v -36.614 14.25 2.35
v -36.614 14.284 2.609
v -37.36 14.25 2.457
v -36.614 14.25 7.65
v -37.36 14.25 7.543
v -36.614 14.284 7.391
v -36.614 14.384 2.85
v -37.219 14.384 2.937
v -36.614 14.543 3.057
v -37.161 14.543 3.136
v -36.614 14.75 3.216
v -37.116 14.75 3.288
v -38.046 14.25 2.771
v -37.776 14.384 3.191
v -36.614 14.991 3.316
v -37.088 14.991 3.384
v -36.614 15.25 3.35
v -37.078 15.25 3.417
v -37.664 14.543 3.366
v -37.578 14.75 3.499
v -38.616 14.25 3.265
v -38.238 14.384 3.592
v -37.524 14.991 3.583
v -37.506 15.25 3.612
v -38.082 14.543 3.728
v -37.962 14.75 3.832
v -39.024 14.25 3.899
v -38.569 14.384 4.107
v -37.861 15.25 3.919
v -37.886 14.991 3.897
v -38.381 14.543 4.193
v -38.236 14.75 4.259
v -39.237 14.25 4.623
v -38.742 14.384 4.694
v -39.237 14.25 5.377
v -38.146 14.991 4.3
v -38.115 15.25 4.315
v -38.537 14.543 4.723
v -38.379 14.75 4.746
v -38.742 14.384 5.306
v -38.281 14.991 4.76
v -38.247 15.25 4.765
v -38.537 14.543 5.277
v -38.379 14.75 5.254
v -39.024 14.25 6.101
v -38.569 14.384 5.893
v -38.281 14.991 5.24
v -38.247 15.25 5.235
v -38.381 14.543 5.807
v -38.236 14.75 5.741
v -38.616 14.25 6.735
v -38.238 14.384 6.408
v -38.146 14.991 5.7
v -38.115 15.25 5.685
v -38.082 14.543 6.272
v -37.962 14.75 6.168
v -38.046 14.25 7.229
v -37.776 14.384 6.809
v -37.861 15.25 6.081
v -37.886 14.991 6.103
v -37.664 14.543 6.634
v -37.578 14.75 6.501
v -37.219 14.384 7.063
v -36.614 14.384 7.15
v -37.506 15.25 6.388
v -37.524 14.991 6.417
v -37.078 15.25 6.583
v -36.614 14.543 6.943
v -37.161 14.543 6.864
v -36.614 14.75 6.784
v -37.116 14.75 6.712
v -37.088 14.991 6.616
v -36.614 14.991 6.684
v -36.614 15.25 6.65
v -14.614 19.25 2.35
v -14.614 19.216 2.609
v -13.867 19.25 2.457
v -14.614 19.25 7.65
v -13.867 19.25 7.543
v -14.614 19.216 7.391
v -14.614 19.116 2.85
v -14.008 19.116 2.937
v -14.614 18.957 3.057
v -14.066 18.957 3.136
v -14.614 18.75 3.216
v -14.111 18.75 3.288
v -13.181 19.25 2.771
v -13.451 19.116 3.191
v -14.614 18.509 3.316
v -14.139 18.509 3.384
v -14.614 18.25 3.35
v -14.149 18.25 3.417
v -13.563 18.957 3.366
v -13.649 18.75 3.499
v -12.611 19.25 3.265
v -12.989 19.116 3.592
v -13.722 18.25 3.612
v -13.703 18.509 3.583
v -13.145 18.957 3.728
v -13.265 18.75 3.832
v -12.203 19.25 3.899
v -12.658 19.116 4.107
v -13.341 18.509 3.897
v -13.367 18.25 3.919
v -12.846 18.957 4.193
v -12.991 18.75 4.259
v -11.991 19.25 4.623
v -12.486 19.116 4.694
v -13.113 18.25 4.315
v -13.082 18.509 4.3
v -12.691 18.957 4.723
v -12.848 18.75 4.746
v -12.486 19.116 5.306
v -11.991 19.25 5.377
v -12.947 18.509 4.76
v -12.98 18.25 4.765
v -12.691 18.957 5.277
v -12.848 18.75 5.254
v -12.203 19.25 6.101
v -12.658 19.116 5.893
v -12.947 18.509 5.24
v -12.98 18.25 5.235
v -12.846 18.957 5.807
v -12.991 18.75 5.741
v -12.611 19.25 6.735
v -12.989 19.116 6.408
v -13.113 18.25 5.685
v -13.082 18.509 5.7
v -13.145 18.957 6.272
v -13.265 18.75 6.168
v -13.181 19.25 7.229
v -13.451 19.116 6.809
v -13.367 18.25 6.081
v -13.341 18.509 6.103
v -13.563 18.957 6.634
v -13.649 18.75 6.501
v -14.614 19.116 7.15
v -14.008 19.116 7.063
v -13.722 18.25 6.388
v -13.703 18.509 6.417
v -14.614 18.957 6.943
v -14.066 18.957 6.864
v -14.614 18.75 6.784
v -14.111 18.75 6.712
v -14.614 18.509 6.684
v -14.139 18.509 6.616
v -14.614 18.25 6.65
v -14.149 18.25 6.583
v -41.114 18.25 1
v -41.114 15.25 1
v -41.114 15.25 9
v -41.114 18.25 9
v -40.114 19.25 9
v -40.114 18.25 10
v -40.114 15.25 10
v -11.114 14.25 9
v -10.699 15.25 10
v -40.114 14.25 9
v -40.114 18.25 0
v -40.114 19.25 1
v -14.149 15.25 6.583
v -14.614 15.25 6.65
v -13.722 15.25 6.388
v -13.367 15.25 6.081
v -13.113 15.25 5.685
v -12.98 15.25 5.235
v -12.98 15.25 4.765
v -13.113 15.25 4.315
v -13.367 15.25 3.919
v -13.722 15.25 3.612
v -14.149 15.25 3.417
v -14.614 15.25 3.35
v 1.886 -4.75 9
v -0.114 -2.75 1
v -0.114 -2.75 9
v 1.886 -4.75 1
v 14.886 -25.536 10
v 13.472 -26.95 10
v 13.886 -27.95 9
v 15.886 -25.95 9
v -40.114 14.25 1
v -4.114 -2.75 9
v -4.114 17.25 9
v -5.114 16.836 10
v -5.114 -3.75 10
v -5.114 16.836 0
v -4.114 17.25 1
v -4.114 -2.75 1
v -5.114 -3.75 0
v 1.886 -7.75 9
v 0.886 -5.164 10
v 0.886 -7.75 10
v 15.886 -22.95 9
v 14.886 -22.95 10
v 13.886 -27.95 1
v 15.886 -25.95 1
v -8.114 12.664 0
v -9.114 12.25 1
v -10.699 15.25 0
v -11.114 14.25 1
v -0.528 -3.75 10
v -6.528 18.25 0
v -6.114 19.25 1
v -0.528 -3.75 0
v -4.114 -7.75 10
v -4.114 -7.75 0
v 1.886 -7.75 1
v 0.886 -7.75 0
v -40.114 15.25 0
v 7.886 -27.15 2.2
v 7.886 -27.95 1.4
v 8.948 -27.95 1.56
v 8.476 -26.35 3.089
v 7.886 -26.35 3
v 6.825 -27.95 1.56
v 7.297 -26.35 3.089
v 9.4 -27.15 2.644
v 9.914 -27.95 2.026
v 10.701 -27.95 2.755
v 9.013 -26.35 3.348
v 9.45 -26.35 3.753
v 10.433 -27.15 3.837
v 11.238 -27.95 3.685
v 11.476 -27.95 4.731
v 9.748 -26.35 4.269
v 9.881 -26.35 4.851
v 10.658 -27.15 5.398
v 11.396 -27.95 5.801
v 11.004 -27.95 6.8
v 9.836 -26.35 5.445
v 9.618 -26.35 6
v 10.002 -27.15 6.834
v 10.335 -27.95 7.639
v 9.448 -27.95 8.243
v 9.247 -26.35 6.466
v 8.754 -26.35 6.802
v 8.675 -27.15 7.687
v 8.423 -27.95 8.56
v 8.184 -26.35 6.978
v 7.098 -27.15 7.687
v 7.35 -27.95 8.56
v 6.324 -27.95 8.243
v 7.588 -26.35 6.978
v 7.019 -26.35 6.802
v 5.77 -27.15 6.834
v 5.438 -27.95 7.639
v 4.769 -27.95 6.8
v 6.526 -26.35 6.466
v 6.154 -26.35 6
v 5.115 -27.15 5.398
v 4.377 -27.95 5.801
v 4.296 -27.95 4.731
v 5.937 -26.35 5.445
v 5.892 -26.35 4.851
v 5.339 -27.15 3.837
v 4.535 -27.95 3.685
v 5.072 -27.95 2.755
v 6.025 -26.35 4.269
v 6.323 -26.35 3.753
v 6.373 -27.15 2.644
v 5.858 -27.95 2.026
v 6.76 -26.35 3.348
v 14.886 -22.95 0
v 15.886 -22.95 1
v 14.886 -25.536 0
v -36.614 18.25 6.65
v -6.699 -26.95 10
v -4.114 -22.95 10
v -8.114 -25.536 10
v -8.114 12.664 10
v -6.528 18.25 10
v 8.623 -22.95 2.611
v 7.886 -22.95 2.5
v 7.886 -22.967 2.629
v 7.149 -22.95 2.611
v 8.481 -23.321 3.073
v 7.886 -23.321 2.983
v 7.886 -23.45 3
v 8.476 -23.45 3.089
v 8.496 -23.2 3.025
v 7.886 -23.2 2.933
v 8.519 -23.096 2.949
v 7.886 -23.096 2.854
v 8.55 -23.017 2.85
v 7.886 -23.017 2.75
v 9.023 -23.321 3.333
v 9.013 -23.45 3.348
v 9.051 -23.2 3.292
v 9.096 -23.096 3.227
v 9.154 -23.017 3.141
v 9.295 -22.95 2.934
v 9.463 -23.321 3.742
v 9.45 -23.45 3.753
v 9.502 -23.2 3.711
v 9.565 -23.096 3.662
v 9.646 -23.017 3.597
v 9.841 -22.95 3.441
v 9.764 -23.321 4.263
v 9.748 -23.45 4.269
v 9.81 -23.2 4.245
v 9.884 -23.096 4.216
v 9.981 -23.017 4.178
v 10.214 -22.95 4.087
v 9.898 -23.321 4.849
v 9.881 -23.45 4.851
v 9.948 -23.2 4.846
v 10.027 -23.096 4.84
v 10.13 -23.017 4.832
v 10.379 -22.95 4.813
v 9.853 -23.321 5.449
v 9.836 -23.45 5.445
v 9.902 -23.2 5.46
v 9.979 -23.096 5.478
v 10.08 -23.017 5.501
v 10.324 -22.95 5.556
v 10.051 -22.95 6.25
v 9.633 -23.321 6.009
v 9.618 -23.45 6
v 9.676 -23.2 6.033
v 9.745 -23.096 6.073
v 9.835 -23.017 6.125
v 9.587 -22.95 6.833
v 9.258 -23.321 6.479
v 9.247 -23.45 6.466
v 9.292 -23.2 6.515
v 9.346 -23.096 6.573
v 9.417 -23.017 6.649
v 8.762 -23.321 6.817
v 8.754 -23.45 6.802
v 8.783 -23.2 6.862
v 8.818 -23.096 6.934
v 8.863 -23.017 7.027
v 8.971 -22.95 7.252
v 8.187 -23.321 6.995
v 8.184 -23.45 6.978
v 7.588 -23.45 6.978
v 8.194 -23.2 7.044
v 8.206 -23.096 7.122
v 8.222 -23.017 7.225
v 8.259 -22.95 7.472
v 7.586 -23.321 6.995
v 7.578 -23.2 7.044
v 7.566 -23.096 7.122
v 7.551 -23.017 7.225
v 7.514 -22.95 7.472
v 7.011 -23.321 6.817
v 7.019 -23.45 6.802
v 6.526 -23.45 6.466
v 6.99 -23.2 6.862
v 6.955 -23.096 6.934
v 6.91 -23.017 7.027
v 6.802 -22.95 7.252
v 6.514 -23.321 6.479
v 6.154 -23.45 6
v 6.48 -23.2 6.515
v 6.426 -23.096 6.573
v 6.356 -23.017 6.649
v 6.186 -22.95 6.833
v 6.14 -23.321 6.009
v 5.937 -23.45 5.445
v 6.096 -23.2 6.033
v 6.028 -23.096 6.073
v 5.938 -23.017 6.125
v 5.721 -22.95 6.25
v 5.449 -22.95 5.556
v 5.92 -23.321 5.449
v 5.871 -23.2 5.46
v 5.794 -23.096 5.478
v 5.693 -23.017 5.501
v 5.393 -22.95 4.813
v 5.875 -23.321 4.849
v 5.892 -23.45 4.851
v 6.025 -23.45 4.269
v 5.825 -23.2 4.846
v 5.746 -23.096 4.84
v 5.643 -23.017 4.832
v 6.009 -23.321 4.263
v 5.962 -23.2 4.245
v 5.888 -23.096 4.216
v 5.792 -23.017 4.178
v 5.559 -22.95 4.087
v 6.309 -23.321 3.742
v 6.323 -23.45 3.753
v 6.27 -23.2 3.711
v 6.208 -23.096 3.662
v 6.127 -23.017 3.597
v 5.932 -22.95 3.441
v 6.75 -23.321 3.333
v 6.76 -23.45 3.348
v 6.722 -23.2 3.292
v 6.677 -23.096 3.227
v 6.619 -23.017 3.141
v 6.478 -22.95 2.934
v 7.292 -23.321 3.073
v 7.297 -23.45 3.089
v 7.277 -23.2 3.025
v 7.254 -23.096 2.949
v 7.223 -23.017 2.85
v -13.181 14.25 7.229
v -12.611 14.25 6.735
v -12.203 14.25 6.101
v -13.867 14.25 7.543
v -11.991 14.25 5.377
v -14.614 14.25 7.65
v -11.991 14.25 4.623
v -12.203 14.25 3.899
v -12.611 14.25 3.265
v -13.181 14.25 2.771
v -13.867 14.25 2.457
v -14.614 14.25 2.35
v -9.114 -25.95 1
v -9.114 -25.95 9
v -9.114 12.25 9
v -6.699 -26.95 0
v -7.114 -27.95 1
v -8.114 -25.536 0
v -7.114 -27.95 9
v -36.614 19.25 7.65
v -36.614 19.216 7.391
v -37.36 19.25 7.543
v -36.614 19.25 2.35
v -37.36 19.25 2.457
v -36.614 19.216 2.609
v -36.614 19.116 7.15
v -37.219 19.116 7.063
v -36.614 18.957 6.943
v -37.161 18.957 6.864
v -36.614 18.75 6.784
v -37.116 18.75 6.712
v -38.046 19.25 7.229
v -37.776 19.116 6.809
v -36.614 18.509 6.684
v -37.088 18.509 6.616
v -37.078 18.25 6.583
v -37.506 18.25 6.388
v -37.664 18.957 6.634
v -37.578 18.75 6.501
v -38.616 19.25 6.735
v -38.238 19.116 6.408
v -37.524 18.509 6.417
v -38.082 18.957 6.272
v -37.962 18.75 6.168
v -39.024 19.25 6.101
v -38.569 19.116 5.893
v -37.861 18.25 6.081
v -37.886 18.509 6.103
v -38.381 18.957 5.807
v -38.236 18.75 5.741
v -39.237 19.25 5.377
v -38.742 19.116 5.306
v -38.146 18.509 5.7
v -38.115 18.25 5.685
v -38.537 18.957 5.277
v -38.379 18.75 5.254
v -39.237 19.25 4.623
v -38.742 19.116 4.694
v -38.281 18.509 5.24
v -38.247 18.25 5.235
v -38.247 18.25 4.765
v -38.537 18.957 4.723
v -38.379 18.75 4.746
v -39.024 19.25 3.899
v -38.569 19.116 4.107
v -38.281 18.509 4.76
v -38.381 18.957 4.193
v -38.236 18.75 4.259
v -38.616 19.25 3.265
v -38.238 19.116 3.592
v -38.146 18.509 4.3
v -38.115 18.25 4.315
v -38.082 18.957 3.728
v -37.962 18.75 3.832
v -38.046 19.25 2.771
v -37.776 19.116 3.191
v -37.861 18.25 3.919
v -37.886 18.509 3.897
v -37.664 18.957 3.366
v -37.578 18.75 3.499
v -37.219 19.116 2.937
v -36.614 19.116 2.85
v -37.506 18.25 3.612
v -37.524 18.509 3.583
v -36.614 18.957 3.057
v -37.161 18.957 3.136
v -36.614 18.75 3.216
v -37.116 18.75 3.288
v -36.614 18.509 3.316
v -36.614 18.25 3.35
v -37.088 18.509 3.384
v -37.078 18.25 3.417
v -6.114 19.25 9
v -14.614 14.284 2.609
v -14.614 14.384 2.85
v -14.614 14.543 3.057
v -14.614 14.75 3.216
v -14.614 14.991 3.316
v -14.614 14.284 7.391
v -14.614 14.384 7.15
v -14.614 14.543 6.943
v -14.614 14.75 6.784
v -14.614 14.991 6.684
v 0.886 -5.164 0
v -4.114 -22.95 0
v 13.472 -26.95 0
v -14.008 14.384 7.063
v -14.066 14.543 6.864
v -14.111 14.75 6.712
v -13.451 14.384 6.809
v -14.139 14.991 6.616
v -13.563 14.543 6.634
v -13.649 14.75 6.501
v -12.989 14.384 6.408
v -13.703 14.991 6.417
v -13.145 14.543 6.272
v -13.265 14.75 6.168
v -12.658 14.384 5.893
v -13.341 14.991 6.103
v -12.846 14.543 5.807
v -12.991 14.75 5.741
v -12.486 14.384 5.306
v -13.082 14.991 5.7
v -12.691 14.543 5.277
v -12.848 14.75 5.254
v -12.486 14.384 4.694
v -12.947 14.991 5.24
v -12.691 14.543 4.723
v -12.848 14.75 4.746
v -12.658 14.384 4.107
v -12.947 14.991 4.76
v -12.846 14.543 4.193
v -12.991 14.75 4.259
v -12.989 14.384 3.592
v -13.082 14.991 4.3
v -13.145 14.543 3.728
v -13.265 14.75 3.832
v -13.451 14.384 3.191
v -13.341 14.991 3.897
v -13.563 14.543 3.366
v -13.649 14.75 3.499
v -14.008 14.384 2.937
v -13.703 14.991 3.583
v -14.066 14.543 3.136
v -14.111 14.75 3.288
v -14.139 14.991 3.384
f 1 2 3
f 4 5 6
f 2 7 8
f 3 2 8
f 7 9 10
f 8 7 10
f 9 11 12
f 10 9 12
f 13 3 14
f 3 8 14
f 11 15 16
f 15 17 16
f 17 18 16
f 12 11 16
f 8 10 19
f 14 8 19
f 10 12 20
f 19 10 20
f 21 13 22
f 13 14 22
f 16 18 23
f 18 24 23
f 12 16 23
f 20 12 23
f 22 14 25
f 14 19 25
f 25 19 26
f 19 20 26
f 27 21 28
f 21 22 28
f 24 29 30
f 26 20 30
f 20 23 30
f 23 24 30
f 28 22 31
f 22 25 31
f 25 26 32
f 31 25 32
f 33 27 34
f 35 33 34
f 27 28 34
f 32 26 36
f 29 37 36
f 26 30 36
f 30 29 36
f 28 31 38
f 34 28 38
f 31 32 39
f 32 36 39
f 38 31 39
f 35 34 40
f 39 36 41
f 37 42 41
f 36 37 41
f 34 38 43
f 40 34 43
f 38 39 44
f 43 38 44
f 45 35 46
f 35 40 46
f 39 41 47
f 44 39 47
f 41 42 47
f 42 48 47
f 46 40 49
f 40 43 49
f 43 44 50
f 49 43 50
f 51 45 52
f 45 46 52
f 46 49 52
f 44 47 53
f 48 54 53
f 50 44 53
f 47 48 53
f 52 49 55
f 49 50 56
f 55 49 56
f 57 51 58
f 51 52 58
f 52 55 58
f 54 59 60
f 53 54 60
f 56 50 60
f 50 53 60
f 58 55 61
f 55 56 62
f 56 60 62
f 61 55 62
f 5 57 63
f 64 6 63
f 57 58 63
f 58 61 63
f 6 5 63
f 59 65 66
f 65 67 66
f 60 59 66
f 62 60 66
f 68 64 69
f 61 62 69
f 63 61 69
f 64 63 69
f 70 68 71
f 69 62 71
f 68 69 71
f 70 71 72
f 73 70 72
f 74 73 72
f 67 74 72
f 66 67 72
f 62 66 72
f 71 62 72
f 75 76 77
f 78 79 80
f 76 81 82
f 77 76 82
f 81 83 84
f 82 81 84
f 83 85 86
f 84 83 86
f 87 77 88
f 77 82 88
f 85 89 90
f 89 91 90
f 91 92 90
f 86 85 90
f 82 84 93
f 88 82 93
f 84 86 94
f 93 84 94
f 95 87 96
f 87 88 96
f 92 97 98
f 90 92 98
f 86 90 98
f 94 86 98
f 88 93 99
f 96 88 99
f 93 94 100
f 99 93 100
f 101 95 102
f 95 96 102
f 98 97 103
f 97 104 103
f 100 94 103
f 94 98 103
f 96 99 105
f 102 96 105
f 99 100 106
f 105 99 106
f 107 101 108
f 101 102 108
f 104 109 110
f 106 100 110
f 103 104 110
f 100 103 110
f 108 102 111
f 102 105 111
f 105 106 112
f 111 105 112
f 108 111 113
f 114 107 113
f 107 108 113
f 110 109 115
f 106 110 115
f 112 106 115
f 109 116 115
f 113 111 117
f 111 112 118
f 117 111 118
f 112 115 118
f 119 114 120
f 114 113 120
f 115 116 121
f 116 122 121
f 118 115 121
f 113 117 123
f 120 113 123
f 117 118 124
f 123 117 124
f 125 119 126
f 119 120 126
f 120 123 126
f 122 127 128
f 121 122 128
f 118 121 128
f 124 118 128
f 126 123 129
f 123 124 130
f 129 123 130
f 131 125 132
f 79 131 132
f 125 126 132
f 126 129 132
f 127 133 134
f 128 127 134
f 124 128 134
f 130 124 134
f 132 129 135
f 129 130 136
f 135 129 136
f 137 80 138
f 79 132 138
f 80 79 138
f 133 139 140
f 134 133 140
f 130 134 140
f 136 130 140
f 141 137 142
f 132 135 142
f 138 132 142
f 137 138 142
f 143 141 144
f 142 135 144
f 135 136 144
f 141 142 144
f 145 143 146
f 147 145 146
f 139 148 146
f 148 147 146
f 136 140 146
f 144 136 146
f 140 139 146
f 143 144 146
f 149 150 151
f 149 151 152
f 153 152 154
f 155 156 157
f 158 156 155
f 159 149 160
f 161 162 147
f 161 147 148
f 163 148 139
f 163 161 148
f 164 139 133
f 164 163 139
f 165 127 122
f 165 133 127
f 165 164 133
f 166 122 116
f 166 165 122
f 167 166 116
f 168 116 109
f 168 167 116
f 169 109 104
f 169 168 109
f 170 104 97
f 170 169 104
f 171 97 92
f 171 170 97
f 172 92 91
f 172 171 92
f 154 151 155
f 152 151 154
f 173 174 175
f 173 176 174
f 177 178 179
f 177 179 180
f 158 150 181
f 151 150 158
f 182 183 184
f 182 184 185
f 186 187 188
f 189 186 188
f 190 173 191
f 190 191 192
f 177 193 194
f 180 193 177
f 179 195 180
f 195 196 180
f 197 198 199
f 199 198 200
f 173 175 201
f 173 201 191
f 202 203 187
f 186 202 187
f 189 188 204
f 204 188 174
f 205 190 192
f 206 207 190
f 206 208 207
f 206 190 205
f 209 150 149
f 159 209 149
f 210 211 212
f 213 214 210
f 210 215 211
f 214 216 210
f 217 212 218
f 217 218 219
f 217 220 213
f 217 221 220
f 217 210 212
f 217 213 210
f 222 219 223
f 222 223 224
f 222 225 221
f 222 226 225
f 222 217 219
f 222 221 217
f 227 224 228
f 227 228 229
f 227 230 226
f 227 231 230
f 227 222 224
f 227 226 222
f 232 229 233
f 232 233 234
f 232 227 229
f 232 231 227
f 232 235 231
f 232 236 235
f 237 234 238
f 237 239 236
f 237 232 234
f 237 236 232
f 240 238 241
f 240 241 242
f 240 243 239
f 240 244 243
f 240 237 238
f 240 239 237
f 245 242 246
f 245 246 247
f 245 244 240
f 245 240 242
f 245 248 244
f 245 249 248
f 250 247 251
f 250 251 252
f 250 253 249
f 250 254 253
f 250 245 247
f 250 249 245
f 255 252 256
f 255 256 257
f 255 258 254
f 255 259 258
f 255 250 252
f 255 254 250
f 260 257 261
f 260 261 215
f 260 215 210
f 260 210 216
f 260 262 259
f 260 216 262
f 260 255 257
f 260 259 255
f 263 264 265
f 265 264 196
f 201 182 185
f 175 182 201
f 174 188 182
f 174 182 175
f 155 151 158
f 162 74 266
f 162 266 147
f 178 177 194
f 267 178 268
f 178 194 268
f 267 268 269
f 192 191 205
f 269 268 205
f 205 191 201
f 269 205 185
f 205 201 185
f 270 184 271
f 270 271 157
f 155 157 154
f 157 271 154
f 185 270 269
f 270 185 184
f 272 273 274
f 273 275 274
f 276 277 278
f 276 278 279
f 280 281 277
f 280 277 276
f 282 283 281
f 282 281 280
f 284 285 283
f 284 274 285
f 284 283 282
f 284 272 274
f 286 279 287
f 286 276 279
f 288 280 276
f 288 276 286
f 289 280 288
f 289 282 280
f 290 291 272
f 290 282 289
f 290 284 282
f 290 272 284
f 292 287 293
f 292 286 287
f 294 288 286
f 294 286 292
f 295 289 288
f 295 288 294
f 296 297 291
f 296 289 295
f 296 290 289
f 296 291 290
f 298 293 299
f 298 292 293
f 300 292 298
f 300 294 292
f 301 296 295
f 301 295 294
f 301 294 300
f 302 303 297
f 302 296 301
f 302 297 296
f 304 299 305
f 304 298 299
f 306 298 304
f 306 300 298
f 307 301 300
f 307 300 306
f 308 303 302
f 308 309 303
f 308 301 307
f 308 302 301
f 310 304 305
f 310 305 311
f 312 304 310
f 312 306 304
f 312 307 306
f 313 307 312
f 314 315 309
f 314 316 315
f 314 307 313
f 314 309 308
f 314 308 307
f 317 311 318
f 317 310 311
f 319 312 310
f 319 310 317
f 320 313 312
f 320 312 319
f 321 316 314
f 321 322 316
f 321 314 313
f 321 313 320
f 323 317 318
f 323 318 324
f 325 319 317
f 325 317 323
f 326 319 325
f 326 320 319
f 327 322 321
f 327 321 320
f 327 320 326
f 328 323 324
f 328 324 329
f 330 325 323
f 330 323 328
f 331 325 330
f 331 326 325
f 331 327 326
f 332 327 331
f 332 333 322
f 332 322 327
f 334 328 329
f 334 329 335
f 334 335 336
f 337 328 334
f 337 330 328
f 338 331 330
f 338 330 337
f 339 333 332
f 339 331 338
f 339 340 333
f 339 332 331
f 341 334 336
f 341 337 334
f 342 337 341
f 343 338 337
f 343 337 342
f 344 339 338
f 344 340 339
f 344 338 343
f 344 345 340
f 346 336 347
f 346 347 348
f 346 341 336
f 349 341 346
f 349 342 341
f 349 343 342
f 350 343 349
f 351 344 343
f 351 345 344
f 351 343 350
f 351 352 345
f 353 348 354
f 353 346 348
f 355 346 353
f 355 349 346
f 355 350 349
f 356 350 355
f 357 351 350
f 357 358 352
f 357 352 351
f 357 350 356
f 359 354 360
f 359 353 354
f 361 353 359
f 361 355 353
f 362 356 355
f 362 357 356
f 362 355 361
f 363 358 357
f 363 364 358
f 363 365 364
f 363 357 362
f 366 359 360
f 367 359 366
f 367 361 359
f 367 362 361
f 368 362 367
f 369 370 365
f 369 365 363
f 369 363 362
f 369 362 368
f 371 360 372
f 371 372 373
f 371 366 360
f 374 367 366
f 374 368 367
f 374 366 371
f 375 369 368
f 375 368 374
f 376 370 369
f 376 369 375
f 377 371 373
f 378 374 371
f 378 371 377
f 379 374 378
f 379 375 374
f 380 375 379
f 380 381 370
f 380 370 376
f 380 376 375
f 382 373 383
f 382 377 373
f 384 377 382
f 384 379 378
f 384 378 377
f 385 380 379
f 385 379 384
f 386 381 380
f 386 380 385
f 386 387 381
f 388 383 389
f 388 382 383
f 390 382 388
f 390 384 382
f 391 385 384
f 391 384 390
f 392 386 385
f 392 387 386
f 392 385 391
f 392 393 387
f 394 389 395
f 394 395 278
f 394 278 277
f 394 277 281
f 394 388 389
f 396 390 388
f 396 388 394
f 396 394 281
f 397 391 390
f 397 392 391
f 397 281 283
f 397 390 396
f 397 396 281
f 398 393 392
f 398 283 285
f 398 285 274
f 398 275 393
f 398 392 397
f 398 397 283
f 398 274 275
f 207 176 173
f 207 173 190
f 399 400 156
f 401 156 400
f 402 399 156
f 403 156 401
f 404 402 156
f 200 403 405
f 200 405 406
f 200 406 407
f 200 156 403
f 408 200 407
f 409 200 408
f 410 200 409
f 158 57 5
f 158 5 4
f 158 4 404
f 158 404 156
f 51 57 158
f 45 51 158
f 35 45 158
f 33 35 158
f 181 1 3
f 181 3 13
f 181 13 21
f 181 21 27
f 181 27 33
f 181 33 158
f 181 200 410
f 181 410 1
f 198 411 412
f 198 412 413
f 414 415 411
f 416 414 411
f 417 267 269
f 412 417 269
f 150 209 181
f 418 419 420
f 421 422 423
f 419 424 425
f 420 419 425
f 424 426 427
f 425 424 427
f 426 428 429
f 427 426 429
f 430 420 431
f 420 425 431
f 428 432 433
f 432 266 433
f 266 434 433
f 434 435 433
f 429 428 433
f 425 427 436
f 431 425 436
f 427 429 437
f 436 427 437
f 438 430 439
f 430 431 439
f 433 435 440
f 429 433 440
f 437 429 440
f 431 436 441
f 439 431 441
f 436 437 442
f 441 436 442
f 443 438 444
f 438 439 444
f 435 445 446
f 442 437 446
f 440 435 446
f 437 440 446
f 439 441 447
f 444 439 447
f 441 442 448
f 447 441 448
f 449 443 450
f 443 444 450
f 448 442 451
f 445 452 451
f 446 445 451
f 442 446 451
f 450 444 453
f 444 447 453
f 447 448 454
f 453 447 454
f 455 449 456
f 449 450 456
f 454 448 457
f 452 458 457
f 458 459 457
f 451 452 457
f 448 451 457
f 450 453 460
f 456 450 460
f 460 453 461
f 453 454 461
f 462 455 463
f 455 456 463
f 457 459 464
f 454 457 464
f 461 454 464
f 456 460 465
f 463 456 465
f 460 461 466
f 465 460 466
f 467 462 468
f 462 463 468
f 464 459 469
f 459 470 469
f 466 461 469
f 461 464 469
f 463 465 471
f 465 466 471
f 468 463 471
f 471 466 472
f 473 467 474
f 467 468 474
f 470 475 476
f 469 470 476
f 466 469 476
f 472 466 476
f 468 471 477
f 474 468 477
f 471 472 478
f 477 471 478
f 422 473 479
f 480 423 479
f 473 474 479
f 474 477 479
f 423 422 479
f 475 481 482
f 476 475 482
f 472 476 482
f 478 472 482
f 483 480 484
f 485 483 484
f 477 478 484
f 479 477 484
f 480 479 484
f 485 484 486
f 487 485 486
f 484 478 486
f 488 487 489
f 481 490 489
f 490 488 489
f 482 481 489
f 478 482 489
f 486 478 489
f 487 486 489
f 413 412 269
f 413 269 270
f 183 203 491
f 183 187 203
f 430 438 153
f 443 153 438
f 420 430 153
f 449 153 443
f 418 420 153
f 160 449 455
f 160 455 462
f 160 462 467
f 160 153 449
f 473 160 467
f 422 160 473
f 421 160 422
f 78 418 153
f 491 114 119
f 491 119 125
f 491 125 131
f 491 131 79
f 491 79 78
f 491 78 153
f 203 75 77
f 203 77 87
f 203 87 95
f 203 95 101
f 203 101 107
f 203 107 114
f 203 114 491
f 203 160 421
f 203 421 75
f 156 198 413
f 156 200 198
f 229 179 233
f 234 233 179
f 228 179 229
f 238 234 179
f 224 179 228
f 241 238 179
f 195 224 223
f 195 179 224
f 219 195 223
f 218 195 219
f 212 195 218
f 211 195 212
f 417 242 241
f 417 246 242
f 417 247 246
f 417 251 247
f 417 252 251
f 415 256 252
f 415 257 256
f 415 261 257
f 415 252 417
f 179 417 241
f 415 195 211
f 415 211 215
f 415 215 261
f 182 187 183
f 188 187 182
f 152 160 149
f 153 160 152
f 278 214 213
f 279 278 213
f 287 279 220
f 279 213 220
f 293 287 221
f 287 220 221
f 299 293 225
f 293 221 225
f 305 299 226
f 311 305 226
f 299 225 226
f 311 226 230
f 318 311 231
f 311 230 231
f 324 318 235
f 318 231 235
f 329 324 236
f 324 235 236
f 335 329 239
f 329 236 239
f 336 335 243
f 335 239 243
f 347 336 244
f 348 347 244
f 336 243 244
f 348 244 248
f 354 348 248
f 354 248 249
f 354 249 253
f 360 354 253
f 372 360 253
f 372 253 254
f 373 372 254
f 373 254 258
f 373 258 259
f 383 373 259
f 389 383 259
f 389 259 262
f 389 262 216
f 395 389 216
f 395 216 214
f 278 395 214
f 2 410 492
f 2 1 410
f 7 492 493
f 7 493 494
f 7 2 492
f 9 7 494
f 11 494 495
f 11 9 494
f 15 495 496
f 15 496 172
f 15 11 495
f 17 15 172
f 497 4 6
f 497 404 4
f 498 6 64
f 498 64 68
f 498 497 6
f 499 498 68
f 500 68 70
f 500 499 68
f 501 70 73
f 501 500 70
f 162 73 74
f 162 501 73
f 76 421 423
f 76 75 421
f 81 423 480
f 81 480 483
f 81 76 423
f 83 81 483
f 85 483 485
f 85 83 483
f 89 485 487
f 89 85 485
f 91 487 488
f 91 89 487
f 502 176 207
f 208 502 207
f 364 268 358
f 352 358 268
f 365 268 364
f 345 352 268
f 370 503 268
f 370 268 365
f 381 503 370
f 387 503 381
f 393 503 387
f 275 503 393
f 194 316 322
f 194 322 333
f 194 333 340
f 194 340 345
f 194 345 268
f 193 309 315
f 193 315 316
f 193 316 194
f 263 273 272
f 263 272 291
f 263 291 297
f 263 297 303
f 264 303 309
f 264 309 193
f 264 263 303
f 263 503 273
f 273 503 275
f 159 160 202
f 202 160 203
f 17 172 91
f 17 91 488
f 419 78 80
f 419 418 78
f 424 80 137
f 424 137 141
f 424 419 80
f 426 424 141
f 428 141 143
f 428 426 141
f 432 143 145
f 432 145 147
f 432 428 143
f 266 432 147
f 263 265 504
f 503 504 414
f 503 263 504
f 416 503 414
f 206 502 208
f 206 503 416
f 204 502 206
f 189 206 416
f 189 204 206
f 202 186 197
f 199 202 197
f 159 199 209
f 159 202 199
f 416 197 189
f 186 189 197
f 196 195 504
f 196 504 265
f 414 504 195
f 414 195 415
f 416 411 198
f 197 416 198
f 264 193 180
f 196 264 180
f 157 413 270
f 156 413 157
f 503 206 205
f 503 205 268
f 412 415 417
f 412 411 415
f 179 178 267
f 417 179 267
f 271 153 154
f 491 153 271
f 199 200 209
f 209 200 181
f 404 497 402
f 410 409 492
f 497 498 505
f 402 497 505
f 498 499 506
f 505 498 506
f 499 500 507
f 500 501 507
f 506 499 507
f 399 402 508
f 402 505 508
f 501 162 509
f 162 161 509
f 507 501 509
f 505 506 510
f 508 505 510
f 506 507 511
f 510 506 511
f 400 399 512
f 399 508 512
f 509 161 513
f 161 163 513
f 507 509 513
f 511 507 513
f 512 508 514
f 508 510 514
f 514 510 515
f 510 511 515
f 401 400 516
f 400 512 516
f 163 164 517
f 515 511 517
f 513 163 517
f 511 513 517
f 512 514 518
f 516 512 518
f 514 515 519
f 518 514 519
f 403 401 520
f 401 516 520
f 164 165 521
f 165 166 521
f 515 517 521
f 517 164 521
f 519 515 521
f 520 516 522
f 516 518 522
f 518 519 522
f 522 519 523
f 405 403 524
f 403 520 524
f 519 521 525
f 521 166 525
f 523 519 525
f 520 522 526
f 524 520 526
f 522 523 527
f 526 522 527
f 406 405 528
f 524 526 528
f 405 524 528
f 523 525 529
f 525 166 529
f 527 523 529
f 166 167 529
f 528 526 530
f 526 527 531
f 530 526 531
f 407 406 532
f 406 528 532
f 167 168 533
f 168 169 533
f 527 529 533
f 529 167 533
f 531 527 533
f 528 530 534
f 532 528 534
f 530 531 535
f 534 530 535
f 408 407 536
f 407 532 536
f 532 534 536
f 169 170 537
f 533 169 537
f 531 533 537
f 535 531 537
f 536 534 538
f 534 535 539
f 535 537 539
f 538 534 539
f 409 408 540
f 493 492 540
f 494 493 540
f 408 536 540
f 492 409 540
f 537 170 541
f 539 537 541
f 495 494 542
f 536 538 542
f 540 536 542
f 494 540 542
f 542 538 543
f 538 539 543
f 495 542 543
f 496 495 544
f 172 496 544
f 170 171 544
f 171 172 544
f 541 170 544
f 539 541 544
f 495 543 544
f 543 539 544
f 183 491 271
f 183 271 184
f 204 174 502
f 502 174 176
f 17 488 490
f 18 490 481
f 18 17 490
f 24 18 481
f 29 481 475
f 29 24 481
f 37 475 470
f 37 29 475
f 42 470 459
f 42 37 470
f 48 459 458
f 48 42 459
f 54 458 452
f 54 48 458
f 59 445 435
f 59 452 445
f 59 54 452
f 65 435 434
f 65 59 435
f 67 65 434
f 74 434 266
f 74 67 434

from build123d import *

# Parameters (mm, degrees)
RESSALTO_EXTRUS_O1_DEPTH = 10
ESBO_O3_R                = 2
CORTE_EXTRUS_O1_DEPTH    = 15
CHANFRO1_SIZE            = 1.6
FILETE1_R                = 0.5
CHANFRO5_SIZE            = 2
CHANFRO8_SIZE            = 1
CORTE_EXTRUS_O3_DEPTH    = 10
FILETE3_R                = 1


with BuildPart() as part:
    # Esboço1 → Ressalto-extrusão1 (new body)
    with BuildSketch(Plane.XY):
        Polygon((1.886382163, -7.75), (-4.113617837, -7.75), (-4.113617837, -22.95), (15.886382163, -22.95), (15.886382163, -27.95), (-9.113617837, -27.95), (-9.113617837, 14.25), (-41.113617837, 14.25), (-41.113617837, 19.25), (-4.113617837, 19.25), (-4.113617837, -2.75), (1.886382163, -2.75), align=None)
    extrude(amount=RESSALTO_EXTRUS_O1_DEPTH)

    # Esboço3 → Corte-extrusão1 (cut)
    with BuildSketch(Plane.XZ.offset(27.95)):
        with Locations(Location((7.886382163, 5, 0), (0, 0, 270))):
            Circle(ESBO_O3_R)
    extrude(amount=-CORTE_EXTRUS_O1_DEPTH, mode=Mode.SUBTRACT)

    # Chanfro1
    chanfro1_edges = [part.edges().sort_by_distance(p)[0] for p in [
        (7.886382163, -27.95, 7),
    ]]
    chamfer(chanfro1_edges, length=CHANFRO1_SIZE)

    # Filete1
    filete1_edges = [part.edges().sort_by_distance(p)[0] for p in [
        (7.886382163, -22.95, 7),
    ]]
    fillet(filete1_edges, radius=FILETE1_R)

    # Chanfro5
    chanfro5_edges = [part.edges().sort_by_distance(p)[0] for p in [
        (15.886382163, -27.95, 5),
        (-9.113617837, -27.95, 5),
        (-9.113617837, 14.25, 5),
        (-4.113617837, 19.25, 5),
        (1.886382163, -2.75, 5),
    ]]
    chamfer(chanfro5_edges, length=CHANFRO5_SIZE)

    # Chanfro8
    chanfro8_edges = [part.edges().sort_by_distance(p)[0] for p in [
        (-4.113617837, 7.25, 10),
        (-26.113617837, 14.25, 0),
        (-41.113617837, 16.75, 0),
        (-4.113617837, 7.25, 0),
        (1.886382163, -6.25, 0),
        (-41.113617837, 16.75, 10),
        (-41.113617837, 14.25, 5),
        (-41.113617837, 19.25, 5),
        (-26.113617837, 14.25, 10),
        (-9.113617837, -6.85, 0),
        (1.886382163, -6.25, 10),
        (-9.113617837, -6.85, 10),
        (-23.613617837, 19.25, 0),
        (-23.613617837, 19.25, 10),
        (15.886382163, -24.45, 0),
        (3.386382163, -27.95, 0),
        (-2.113617837, -2.75, 0),
        (0.886382163, -3.75, 0),
        (14.886382163, -26.95, 0),
        (-8.113617837, -26.95, 0),
        (-5.113617837, 18.25, 0),
        (-2.113617837, -2.75, 10),
        (3.386382163, -27.95, 10),
        (15.886382163, -24.45, 10),
        (0.886382163, -3.75, 10),
        (14.886382163, -26.95, 10),
        (-8.113617837, -26.95, 10),
        (-5.113617837, 18.25, 10),
        (-10.113617837, 13.25, 0),
        (-10.113617837, 13.25, 10),
    ]]
    chamfer(chanfro8_edges, length=CHANFRO8_SIZE)

    # Esboço4 → Corte-extrusão3 (cut)
    with BuildSketch(Plane.XZ.offset(-14.25)):
        with BuildLine():
            Line((-36.613617837, 6.65), (-14.613617837, 6.65))
            ThreePointArc((-14.613617837, 6.65), (-12.963617837, 5), (-14.613617837, 3.35))
            Line((-14.613617837, 3.35), (-36.613617837, 3.35))
            ThreePointArc((-36.613617837, 3.35), (-38.263617837, 5), (-36.613617837, 6.65))
        make_face()
    extrude(amount=-CORTE_EXTRUS_O3_DEPTH, mode=Mode.SUBTRACT)

    # Filete3
    filete3_edges = [part.edges().sort_by_distance(p)[0] for p in [
        (-38.263617837, 19.25, 5),
        (-25.613617837, 19.25, 6.65),
        (-12.963617837, 19.25, 5),
        (-25.613617837, 19.25, 3.35),
        (-38.263617837, 14.25, 5),
        (-25.613617837, 14.25, 3.35),
        (-12.963617837, 14.25, 5),
        (-25.613617837, 14.25, 6.65),
    ]]
    fillet(filete3_edges, radius=FILETE3_R)


solid = part.part
